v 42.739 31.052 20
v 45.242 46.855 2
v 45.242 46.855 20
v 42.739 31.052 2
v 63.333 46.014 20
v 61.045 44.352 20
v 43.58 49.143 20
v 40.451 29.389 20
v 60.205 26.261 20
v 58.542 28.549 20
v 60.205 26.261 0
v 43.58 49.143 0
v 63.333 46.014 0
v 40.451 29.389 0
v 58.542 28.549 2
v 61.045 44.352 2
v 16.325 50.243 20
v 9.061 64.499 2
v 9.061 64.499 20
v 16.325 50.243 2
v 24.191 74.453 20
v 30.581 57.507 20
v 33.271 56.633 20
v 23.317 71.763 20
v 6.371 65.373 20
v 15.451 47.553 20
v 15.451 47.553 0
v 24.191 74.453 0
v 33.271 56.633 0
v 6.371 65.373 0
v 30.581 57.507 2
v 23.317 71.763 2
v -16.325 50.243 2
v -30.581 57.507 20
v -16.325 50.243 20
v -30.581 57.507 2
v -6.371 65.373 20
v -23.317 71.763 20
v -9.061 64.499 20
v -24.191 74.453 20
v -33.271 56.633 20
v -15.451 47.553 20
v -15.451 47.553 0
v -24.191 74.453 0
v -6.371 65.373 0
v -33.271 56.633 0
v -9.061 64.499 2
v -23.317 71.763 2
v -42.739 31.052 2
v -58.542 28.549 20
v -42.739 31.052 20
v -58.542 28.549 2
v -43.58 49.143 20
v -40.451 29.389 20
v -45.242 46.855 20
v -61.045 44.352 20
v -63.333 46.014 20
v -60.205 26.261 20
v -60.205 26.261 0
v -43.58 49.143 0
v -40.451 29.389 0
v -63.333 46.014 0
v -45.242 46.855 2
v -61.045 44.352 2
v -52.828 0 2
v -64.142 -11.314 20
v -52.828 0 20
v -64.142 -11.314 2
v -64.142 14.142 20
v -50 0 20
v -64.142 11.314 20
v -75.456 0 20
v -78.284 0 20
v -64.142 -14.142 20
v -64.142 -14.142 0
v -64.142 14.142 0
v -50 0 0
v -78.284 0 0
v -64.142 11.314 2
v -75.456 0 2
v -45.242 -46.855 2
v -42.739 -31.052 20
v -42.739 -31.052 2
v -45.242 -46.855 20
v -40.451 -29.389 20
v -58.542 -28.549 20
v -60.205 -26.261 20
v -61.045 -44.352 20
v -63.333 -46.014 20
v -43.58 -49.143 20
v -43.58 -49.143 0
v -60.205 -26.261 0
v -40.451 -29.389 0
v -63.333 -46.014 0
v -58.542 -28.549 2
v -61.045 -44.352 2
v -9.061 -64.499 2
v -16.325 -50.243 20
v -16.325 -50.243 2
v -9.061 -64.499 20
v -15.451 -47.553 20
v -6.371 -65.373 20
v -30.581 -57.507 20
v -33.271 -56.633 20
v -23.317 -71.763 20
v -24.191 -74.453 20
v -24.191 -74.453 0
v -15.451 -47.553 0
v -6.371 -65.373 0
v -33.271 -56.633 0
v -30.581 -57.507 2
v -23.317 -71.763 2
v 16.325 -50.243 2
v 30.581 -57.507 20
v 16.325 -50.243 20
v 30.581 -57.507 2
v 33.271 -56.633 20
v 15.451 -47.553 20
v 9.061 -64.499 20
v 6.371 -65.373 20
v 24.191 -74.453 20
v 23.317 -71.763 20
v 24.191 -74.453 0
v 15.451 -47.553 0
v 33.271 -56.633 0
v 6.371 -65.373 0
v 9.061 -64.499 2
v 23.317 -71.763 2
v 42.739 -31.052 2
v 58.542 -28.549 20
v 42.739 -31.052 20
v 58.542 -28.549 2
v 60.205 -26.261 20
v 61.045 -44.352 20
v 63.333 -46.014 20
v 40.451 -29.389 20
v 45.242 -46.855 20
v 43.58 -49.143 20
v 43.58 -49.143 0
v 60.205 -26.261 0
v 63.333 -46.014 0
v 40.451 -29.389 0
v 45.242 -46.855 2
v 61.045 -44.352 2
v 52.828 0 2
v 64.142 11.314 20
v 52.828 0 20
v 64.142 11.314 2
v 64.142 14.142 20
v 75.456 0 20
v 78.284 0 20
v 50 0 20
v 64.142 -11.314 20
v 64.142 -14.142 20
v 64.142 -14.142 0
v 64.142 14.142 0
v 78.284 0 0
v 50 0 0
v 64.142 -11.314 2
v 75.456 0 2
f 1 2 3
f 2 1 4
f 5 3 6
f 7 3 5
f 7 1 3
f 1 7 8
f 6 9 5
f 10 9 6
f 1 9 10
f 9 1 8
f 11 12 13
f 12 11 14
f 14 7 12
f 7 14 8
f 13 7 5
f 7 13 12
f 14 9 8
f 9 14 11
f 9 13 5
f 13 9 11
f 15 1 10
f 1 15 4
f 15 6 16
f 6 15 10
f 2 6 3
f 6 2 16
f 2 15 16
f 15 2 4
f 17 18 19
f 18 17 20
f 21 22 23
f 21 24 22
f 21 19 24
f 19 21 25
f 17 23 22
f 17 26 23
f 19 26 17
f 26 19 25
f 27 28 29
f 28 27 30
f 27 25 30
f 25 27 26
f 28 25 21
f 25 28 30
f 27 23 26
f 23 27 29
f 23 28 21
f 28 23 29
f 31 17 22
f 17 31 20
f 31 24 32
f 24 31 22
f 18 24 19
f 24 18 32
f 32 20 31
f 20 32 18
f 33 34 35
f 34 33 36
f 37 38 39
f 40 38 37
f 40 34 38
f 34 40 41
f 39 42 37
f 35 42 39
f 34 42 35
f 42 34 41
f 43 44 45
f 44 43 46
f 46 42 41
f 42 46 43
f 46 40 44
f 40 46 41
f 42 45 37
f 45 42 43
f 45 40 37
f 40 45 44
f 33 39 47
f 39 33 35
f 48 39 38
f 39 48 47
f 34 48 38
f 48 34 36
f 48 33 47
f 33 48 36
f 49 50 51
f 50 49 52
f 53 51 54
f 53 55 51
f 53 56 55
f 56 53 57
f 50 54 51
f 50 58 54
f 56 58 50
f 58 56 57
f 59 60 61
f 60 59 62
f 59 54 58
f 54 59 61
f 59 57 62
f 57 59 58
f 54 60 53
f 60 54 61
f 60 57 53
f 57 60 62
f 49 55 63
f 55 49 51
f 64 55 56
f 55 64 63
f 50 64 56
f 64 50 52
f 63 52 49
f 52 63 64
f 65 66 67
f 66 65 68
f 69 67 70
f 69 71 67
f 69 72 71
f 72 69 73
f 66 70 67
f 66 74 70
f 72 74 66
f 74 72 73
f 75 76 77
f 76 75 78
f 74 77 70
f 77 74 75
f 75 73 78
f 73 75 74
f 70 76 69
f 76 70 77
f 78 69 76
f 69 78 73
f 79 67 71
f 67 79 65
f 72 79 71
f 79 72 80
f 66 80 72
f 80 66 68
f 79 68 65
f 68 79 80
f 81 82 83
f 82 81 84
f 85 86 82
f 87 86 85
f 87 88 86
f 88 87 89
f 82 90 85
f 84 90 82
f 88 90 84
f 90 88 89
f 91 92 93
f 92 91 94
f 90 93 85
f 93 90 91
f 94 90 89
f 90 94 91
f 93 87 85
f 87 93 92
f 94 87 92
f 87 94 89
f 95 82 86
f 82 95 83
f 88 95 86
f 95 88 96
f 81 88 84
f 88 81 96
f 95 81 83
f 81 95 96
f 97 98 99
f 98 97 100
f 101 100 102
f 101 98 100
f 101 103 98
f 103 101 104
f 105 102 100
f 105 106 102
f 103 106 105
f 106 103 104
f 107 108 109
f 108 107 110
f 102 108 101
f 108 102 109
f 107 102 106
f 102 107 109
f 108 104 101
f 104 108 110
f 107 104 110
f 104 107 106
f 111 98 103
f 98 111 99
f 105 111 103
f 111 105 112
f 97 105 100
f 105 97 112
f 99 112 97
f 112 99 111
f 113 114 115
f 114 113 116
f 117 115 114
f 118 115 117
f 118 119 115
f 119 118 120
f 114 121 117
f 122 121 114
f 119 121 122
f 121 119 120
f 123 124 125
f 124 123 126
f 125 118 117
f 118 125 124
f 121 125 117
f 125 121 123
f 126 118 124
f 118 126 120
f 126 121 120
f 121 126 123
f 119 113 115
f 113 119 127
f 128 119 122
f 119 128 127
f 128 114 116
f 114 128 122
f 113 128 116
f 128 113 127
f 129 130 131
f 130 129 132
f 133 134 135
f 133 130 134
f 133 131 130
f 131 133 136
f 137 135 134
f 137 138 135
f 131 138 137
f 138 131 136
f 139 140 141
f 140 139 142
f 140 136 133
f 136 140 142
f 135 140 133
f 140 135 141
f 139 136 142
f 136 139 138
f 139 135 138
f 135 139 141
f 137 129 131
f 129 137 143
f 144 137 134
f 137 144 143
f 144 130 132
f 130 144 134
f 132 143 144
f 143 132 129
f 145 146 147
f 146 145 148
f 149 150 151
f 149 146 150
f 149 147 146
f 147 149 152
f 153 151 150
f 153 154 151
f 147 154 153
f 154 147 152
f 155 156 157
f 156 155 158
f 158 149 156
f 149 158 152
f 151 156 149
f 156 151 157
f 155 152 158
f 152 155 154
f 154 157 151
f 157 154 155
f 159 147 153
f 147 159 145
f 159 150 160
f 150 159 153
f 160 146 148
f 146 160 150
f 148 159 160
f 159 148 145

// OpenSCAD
/*
Exercicio 3:
Usando os comandos aprendidos até agora, crie uma forma geométrica
composta de 6 caixas 20x20x20 dispostas ao redor de um circulo de
de raio 30 de modo que uma diagonal esteja alinhada com o centro
do círculo.
*/

module caixa(A=20,L=20,C=20,E=2) {
    //base
    cube([L,C,E]);

    //lateral direita
    for (i = [0, 1]) {
        //Laterais
        translate(i * [L - E,0,0]) cube([E,C,A]);
        //frente e fundo
        translate(i * [0,C - E,0]) cube([L,E,A]);
    }
}

N=10;
Raio = 50;

for (i = [1:N]){
    rotate(i* [0,0,360/N])
        translate([Raio,0,0])
            rotate([0,0,-45])
                caixa();
}
